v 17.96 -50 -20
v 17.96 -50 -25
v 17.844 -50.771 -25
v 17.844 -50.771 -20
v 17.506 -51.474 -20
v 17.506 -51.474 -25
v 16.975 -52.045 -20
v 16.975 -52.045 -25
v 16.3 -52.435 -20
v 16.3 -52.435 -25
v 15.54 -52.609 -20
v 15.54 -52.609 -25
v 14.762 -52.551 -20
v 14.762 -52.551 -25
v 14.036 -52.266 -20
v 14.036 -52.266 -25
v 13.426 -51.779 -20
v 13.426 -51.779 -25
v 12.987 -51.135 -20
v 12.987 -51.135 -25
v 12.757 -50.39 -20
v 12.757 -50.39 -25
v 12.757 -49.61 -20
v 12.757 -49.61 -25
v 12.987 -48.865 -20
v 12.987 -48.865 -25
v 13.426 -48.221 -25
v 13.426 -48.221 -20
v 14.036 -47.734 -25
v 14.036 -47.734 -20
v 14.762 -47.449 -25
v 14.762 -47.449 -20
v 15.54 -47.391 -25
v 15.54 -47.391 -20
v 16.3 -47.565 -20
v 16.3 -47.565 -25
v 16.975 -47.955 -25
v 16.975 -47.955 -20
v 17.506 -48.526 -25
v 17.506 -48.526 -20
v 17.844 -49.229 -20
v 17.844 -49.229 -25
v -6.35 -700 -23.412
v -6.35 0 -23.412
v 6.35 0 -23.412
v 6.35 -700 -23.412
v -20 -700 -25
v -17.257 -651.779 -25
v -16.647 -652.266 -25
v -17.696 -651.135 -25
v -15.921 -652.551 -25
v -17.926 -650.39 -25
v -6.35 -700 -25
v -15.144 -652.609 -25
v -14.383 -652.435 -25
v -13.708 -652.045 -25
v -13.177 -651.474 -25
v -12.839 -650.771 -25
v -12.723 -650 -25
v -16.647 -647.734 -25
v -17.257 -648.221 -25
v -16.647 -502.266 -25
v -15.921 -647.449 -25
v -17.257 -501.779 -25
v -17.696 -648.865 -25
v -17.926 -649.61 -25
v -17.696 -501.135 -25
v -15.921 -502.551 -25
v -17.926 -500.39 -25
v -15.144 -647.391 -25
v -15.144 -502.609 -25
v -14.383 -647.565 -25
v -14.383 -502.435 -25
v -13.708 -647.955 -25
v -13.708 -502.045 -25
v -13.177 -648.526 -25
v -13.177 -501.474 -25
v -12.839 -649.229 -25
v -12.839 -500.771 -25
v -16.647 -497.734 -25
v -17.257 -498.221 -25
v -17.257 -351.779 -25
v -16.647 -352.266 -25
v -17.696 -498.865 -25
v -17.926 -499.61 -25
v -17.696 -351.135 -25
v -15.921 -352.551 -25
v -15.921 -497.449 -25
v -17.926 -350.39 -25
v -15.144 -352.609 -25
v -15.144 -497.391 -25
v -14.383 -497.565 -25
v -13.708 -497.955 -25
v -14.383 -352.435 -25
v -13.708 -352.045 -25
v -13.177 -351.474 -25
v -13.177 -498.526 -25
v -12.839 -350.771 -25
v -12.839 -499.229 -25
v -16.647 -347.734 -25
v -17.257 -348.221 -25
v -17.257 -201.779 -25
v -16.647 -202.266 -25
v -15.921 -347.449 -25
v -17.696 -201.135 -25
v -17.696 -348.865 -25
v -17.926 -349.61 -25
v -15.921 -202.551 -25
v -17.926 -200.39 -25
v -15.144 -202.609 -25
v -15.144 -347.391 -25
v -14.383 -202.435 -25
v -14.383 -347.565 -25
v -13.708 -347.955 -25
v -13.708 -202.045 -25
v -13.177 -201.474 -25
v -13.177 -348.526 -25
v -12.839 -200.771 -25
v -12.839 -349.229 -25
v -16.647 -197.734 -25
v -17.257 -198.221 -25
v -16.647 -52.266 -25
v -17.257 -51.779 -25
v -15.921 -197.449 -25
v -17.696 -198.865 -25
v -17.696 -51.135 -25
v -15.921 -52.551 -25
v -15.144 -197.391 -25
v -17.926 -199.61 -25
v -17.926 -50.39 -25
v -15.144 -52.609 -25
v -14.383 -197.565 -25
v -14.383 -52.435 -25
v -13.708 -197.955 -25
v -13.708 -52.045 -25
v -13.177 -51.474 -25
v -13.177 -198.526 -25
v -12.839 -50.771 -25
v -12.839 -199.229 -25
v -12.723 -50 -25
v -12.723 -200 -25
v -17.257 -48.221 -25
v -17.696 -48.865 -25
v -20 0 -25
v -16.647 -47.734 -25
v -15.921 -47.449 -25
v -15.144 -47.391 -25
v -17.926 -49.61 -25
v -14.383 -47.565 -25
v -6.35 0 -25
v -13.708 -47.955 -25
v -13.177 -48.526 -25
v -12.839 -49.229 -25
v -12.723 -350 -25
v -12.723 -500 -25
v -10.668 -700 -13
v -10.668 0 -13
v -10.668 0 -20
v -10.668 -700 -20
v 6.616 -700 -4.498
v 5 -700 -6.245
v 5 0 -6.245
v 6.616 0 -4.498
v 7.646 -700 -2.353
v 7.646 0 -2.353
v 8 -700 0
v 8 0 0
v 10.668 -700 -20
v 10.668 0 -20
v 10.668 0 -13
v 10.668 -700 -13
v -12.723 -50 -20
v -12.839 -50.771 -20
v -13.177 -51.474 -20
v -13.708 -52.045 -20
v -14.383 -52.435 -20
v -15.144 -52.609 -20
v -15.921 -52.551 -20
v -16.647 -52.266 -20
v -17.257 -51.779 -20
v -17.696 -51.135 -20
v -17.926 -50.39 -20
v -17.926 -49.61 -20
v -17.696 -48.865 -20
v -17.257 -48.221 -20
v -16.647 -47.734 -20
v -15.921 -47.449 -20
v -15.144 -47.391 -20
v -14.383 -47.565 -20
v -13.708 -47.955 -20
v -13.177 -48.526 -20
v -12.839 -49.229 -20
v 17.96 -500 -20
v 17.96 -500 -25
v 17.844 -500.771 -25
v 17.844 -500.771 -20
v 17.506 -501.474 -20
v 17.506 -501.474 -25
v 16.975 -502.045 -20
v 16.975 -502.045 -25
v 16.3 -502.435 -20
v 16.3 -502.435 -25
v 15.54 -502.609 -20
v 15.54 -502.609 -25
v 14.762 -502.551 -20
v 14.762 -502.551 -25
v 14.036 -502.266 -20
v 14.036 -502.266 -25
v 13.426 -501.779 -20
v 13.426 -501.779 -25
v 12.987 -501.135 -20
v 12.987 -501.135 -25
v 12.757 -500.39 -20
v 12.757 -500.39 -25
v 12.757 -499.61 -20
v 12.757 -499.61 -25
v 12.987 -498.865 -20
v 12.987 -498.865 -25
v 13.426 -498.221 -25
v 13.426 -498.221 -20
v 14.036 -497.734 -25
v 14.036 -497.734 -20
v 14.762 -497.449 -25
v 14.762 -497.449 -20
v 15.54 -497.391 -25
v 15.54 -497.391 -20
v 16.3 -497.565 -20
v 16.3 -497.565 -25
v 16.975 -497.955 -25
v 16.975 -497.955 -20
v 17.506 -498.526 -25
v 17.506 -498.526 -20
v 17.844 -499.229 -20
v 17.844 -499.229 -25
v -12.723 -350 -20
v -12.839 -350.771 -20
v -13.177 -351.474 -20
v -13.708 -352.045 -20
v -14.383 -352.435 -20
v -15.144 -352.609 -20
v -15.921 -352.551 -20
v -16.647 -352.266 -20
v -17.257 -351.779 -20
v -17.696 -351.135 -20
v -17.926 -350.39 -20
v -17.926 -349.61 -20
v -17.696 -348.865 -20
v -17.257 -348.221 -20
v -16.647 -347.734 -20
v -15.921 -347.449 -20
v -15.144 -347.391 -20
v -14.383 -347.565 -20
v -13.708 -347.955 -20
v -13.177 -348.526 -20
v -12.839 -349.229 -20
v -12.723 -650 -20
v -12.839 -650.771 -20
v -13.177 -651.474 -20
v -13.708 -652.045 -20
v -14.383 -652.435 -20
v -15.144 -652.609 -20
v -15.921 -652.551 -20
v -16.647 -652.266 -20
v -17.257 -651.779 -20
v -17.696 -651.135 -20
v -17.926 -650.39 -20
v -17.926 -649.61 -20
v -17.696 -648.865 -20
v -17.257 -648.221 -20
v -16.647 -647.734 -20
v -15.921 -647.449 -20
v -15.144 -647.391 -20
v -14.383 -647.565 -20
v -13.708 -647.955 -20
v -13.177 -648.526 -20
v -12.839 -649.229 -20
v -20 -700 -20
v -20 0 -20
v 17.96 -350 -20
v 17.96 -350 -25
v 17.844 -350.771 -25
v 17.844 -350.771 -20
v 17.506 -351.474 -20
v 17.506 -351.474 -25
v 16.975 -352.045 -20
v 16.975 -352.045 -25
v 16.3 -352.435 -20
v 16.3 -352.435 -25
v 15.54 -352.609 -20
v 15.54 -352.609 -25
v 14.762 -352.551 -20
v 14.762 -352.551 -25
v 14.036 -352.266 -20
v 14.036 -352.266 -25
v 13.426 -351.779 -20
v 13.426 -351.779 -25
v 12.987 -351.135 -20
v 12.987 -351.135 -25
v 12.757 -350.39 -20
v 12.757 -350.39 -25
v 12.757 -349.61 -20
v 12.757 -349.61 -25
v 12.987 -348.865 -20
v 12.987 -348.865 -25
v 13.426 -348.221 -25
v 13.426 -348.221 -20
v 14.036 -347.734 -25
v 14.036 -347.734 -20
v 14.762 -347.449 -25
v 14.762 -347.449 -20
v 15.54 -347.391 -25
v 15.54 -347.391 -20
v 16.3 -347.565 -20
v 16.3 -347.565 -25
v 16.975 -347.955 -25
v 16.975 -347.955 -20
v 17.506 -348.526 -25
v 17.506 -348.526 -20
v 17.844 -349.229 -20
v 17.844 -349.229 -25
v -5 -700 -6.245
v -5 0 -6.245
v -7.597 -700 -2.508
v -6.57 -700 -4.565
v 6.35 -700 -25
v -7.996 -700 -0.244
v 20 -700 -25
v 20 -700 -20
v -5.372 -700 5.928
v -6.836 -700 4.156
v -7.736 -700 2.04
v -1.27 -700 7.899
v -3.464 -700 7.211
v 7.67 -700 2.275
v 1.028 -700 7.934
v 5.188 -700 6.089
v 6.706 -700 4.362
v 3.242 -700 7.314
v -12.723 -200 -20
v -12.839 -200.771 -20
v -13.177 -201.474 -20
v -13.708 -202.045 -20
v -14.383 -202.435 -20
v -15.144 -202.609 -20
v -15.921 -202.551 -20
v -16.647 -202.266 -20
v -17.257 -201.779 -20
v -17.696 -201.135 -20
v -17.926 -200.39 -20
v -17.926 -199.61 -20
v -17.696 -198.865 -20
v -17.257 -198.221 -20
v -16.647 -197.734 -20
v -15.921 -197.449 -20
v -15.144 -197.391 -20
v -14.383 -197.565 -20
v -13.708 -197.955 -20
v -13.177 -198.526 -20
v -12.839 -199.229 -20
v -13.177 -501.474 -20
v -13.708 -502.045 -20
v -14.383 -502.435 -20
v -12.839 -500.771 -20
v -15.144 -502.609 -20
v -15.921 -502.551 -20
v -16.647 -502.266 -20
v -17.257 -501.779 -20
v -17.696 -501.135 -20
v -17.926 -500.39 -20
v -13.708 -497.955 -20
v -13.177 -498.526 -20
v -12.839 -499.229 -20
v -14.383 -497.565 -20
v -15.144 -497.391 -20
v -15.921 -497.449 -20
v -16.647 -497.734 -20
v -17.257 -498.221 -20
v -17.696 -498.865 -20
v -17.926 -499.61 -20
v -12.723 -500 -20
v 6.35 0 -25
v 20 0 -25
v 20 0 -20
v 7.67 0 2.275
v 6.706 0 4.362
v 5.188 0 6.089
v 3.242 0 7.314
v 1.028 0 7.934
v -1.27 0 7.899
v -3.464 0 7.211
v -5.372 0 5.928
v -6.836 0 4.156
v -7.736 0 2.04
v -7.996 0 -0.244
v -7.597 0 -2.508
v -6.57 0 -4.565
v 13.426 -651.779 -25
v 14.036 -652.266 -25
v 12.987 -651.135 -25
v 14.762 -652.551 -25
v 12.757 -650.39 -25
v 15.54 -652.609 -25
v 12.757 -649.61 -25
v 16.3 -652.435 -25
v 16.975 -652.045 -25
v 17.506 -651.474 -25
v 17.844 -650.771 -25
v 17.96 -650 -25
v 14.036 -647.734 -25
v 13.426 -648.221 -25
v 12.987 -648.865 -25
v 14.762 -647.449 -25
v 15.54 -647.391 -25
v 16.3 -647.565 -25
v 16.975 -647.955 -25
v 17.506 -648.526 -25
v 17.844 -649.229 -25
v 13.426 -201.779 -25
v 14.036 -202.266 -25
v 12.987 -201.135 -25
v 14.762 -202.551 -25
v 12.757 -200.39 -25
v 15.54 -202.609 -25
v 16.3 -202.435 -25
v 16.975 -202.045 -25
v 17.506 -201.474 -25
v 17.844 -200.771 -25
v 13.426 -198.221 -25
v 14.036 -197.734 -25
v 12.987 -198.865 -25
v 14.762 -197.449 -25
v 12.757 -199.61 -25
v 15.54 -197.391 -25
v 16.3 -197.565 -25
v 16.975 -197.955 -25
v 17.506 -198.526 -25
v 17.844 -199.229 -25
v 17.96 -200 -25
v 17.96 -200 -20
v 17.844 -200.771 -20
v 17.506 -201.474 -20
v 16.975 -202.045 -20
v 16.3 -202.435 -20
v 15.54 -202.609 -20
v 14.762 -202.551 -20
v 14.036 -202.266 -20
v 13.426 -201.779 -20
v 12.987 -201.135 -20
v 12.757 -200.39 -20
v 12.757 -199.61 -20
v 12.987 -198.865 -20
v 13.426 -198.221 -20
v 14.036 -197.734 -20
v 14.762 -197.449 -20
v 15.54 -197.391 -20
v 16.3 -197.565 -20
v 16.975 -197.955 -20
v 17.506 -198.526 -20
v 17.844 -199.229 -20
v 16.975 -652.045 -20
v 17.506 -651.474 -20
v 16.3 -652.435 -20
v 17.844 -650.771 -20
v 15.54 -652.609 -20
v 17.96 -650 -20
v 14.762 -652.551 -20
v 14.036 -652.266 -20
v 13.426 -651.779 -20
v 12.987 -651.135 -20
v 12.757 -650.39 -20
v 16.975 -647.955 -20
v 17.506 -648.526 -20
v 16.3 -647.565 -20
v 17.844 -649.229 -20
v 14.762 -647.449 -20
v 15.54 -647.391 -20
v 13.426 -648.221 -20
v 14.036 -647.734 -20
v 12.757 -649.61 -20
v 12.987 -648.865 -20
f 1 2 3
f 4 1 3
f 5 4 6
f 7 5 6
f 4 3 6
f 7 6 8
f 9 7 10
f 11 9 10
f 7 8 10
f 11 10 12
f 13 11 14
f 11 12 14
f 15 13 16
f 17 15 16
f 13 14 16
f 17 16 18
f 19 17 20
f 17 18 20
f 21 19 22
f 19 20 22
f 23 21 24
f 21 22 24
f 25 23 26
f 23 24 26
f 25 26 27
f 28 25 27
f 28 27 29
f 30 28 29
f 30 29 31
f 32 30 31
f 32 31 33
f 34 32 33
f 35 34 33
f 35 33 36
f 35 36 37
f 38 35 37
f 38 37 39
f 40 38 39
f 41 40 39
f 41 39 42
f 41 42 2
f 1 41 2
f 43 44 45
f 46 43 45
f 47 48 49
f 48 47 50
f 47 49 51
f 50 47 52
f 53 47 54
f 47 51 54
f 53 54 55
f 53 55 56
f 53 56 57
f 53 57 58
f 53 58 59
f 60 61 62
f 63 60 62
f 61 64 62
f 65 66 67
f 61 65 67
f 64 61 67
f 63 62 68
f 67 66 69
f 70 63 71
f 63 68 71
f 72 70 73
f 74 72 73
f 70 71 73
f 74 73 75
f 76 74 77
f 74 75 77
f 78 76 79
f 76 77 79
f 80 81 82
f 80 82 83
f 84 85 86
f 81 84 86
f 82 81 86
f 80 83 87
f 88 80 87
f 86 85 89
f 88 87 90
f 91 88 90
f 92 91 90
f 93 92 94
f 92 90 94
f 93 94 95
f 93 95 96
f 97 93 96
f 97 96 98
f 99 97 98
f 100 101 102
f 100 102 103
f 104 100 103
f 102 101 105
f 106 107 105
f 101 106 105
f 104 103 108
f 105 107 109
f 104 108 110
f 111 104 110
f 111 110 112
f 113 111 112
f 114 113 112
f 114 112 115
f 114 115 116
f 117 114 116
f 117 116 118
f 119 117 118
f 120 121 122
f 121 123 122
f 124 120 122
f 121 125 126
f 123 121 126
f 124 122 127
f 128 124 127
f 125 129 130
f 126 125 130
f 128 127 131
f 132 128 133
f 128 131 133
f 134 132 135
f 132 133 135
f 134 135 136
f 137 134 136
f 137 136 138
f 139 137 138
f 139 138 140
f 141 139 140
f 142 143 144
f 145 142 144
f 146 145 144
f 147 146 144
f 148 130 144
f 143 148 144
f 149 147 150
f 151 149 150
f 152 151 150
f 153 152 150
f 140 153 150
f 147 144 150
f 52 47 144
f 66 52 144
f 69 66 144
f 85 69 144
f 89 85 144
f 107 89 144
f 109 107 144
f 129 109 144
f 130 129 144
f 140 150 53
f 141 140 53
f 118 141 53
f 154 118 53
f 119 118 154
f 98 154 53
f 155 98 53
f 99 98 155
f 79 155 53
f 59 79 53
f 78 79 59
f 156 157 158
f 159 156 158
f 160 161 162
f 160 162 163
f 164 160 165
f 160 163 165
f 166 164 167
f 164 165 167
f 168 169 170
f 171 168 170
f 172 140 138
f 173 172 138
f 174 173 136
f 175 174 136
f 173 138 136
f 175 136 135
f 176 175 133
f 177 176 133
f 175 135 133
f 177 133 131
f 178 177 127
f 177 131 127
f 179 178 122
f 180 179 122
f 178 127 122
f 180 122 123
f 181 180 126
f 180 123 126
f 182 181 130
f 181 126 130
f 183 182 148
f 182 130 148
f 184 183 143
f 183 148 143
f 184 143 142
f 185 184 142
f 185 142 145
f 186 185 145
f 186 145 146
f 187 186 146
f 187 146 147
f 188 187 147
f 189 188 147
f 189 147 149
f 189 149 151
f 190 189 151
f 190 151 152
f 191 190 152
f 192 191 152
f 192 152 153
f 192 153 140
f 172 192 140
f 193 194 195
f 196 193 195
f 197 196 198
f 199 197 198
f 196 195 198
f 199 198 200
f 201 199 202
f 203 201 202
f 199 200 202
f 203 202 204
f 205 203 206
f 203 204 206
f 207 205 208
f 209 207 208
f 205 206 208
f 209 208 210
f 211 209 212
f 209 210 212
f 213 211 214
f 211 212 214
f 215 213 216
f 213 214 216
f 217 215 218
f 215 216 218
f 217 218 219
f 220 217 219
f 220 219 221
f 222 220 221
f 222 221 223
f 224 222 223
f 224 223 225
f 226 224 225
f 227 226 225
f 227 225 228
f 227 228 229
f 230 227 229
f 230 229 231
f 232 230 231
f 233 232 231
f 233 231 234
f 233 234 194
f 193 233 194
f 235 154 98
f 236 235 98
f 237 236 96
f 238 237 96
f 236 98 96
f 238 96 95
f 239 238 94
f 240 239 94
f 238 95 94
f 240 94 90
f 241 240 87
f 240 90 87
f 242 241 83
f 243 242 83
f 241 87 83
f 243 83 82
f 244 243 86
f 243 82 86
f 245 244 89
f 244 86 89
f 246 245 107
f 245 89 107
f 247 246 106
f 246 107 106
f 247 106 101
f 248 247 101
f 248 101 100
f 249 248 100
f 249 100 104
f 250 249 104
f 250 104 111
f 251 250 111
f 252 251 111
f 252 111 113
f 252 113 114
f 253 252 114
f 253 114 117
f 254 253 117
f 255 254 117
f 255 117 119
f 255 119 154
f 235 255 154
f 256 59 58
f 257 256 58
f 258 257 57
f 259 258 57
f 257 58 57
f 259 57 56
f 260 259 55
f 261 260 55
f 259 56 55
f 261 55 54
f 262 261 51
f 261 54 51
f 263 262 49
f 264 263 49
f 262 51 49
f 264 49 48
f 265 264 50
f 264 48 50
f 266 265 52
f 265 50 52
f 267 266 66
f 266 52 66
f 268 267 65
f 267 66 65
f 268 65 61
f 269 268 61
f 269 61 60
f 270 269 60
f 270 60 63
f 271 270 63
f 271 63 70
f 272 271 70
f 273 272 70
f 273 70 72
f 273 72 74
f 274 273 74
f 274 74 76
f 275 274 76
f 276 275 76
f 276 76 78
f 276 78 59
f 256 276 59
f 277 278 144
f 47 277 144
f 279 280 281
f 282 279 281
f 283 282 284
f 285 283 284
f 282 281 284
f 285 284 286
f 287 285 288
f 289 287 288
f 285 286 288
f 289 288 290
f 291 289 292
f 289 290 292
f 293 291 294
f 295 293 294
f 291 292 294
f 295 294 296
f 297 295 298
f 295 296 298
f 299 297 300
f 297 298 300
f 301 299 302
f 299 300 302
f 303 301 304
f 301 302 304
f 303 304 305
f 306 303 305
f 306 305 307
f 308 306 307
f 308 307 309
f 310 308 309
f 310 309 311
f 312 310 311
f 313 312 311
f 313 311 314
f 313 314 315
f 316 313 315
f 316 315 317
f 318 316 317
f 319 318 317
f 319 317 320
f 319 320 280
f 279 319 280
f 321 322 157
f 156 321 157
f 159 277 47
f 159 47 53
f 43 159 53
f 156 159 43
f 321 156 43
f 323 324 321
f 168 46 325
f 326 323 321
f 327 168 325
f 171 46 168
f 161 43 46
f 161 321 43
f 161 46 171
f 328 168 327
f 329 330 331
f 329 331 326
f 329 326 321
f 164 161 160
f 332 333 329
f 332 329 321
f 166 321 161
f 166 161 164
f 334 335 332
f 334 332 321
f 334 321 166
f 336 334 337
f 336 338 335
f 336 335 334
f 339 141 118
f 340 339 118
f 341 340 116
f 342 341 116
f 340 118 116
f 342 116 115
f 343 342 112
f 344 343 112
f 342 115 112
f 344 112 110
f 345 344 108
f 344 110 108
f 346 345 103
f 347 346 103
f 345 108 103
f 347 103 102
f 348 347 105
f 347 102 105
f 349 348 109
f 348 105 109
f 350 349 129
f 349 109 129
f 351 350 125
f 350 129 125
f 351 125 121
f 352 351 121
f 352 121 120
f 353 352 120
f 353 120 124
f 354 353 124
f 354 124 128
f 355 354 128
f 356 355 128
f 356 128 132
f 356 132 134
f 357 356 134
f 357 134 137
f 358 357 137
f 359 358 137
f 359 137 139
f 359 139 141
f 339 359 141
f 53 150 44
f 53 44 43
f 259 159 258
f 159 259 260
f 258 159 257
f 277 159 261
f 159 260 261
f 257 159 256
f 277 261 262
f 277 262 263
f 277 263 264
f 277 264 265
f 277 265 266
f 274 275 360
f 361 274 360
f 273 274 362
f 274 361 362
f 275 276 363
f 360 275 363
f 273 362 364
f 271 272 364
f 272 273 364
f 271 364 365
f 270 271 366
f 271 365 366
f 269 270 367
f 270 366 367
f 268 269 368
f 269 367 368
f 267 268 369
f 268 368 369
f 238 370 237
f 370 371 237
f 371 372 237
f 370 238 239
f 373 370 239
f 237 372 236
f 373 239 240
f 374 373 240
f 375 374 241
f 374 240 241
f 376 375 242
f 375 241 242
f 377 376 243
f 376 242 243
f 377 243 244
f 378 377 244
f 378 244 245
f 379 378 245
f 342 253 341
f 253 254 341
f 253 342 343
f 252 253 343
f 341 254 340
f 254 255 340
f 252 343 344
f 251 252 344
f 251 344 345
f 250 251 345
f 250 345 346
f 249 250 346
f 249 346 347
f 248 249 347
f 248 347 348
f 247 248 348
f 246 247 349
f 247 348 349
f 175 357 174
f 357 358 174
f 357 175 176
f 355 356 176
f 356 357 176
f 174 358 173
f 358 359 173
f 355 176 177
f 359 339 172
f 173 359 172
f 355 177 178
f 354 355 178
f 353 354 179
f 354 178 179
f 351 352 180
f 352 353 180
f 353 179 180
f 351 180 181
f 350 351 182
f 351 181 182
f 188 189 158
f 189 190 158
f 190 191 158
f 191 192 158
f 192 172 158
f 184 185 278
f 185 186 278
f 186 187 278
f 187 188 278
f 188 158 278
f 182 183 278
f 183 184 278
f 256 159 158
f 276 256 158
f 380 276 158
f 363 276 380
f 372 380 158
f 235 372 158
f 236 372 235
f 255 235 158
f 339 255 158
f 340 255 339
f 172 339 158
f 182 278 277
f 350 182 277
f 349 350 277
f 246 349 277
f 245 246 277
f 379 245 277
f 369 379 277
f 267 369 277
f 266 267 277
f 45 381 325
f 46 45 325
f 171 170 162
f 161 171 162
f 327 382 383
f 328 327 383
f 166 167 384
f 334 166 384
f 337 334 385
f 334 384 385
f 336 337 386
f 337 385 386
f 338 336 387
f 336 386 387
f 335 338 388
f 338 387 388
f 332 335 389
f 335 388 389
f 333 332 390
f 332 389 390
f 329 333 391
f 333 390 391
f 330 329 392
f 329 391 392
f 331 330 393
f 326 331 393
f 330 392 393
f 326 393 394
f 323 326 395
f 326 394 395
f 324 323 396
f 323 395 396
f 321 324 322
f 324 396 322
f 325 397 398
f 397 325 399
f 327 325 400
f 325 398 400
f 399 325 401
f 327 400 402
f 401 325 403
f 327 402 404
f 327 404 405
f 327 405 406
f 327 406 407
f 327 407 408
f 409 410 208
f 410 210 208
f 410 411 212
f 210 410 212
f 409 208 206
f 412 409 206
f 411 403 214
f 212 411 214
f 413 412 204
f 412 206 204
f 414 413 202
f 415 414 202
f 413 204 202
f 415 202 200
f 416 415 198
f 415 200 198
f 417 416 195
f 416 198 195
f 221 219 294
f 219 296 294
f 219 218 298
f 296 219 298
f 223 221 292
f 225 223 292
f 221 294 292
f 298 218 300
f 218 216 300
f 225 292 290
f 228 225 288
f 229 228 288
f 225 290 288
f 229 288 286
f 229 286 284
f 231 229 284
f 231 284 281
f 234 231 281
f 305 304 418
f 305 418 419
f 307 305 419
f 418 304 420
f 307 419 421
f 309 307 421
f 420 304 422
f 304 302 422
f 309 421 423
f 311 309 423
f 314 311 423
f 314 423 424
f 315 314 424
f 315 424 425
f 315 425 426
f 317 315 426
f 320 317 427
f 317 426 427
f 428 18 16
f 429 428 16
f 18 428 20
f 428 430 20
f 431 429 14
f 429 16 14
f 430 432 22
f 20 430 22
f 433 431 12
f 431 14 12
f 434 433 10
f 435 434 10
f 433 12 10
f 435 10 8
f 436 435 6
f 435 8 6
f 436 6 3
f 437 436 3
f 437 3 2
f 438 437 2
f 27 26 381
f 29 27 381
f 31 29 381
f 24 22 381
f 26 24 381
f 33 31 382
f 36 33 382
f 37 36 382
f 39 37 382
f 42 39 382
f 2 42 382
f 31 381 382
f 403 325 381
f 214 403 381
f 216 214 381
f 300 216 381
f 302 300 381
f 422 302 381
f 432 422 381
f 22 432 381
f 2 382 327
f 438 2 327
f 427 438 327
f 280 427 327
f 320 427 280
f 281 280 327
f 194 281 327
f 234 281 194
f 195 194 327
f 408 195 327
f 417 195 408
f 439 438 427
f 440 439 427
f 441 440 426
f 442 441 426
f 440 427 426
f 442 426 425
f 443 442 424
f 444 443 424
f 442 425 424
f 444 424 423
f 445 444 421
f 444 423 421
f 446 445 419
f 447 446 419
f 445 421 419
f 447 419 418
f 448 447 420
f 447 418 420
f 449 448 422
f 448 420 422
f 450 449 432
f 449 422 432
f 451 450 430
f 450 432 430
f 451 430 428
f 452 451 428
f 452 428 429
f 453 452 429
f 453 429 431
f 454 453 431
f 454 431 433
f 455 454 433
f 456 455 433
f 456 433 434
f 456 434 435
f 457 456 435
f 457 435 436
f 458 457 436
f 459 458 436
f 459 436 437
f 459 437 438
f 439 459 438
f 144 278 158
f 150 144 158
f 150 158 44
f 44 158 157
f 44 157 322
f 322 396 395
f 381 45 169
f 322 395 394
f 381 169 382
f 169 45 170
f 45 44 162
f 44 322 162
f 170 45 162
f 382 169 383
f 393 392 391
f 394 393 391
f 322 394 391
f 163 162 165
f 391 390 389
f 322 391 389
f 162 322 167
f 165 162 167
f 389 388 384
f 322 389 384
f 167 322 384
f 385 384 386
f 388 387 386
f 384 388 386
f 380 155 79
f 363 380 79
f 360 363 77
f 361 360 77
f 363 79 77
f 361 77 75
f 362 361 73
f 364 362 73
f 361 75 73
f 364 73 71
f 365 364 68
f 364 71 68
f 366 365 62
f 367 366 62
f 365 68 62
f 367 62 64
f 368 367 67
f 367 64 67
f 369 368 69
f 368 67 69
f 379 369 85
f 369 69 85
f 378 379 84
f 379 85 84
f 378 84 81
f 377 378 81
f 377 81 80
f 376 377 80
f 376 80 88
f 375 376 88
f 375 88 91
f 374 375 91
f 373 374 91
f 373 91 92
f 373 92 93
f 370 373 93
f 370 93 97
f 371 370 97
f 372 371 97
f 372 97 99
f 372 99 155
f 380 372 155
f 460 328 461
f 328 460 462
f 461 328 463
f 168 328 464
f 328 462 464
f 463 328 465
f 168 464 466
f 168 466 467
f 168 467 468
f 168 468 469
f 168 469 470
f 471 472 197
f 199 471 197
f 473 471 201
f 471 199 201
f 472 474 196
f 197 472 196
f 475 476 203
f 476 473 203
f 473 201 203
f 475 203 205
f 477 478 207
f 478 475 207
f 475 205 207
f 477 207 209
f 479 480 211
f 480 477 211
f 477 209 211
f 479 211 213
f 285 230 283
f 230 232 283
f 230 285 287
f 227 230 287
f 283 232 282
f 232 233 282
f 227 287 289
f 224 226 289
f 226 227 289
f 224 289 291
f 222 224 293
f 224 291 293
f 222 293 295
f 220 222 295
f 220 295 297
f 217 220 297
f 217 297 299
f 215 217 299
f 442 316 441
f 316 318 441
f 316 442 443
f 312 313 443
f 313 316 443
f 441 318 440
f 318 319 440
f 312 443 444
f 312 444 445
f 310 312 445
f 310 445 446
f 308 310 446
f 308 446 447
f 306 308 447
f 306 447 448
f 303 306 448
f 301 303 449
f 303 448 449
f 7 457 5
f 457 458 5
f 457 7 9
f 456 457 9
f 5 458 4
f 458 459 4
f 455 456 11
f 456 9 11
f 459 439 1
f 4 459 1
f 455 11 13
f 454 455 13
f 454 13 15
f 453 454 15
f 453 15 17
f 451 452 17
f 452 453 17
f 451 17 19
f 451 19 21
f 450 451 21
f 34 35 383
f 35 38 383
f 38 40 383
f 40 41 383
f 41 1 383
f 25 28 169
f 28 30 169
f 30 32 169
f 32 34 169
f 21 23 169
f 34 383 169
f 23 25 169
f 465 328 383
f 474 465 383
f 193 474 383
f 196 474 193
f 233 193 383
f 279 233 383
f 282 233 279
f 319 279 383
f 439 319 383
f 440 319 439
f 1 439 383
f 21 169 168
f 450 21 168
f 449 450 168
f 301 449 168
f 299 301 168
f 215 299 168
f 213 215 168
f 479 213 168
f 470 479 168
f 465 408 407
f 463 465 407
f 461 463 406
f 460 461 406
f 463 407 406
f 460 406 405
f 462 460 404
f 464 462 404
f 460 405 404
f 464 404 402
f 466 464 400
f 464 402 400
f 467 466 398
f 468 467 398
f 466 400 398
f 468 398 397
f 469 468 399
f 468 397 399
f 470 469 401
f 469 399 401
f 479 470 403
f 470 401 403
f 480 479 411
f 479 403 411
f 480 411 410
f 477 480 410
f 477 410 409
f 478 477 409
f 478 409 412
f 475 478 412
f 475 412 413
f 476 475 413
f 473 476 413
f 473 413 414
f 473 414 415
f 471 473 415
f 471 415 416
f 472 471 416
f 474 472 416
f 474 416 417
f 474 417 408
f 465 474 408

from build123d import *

# Parameters (mm, degrees)
F1_DEPTH = 700
F2_W     = 12.7
F2_H     = 1150
F3_DEPTH = 1.5875
F4_R     = 2.6162
F5_DEPTH = 33.001


with BuildPart() as f1:
    # F0 (on Front) → F1 (new body)
    with BuildSketch(Plane.XZ):
        with BuildLine():
            ThreePointArc((5, -6.244998), (7.211103, -3.464102), (8, 0))
            ThreePointArc((8, 0), (-3.464102, 7.211103), (-5, -6.244998))
            ThreePointArc((-5, -6.244998), (0, -8), (5, -6.244998))
        make_face()
        with BuildLine():
            ThreePointArc((5, -6.244998), (0, -8), (-5, -6.244998))
            Line((-5, -6.244998), (-10.66812, -13))
            Line((-10.66812, -13), (-10.66812, -20))
            Line((-10.66812, -20), (-20, -20))
            Line((-20, -20), (-20, -25))
            Line((-20, -25), (20, -25))
            Line((20, -25), (20, -20))
            Line((20, -20), (16.541817, -20))
            Line((16.541817, -20), (10.66812, -20))
            Line((10.66812, -20), (10.66812, -13))
            Line((10.66812, -13), (5, -6.244998))
        make_face()
    extrude(amount=F1_DEPTH)

    # F2 (on face) → F3 (cut)
    with BuildSketch(Plane(origin=(0, 0, -25), x_dir=(1, 0, 0), z_dir=(0, 0, -1))):
        with Locations((0, 575)):
            Rectangle(F2_W, F2_H)
    extrude(amount=-F3_DEPTH, mode=Mode.SUBTRACT)

    # F4 (on face) → F5 (cut, through all)
    with BuildSketch(Plane(origin=(0, 0, -25), x_dir=(1, 0, 0), z_dir=(0, 0, -1))):
        with Locations((-15.3391, 350)):
            Circle(F4_R)
        with Locations((15.3441, 350)):
            Circle(F4_R)
        with Locations((15.3441, 650)):
            Circle(F4_R)
        with Locations((-15.3391, 650)):
            Circle(F4_R)
        with Locations((15.3441, 500)):
            Circle(F4_R)
        with Locations((-15.3391, 500)):
            Circle(F4_R)
        with Locations((15.3441, 200)):
            Circle(F4_R)
        with Locations((-15.3391, 200)):
            Circle(F4_R)
        with Locations((15.3441, 50)):
            Circle(F4_R)
        with Locations((-15.3391, 50)):
            Circle(F4_R)
    extrude(amount=-F5_DEPTH, mode=Mode.SUBTRACT)


solid = f1.part
